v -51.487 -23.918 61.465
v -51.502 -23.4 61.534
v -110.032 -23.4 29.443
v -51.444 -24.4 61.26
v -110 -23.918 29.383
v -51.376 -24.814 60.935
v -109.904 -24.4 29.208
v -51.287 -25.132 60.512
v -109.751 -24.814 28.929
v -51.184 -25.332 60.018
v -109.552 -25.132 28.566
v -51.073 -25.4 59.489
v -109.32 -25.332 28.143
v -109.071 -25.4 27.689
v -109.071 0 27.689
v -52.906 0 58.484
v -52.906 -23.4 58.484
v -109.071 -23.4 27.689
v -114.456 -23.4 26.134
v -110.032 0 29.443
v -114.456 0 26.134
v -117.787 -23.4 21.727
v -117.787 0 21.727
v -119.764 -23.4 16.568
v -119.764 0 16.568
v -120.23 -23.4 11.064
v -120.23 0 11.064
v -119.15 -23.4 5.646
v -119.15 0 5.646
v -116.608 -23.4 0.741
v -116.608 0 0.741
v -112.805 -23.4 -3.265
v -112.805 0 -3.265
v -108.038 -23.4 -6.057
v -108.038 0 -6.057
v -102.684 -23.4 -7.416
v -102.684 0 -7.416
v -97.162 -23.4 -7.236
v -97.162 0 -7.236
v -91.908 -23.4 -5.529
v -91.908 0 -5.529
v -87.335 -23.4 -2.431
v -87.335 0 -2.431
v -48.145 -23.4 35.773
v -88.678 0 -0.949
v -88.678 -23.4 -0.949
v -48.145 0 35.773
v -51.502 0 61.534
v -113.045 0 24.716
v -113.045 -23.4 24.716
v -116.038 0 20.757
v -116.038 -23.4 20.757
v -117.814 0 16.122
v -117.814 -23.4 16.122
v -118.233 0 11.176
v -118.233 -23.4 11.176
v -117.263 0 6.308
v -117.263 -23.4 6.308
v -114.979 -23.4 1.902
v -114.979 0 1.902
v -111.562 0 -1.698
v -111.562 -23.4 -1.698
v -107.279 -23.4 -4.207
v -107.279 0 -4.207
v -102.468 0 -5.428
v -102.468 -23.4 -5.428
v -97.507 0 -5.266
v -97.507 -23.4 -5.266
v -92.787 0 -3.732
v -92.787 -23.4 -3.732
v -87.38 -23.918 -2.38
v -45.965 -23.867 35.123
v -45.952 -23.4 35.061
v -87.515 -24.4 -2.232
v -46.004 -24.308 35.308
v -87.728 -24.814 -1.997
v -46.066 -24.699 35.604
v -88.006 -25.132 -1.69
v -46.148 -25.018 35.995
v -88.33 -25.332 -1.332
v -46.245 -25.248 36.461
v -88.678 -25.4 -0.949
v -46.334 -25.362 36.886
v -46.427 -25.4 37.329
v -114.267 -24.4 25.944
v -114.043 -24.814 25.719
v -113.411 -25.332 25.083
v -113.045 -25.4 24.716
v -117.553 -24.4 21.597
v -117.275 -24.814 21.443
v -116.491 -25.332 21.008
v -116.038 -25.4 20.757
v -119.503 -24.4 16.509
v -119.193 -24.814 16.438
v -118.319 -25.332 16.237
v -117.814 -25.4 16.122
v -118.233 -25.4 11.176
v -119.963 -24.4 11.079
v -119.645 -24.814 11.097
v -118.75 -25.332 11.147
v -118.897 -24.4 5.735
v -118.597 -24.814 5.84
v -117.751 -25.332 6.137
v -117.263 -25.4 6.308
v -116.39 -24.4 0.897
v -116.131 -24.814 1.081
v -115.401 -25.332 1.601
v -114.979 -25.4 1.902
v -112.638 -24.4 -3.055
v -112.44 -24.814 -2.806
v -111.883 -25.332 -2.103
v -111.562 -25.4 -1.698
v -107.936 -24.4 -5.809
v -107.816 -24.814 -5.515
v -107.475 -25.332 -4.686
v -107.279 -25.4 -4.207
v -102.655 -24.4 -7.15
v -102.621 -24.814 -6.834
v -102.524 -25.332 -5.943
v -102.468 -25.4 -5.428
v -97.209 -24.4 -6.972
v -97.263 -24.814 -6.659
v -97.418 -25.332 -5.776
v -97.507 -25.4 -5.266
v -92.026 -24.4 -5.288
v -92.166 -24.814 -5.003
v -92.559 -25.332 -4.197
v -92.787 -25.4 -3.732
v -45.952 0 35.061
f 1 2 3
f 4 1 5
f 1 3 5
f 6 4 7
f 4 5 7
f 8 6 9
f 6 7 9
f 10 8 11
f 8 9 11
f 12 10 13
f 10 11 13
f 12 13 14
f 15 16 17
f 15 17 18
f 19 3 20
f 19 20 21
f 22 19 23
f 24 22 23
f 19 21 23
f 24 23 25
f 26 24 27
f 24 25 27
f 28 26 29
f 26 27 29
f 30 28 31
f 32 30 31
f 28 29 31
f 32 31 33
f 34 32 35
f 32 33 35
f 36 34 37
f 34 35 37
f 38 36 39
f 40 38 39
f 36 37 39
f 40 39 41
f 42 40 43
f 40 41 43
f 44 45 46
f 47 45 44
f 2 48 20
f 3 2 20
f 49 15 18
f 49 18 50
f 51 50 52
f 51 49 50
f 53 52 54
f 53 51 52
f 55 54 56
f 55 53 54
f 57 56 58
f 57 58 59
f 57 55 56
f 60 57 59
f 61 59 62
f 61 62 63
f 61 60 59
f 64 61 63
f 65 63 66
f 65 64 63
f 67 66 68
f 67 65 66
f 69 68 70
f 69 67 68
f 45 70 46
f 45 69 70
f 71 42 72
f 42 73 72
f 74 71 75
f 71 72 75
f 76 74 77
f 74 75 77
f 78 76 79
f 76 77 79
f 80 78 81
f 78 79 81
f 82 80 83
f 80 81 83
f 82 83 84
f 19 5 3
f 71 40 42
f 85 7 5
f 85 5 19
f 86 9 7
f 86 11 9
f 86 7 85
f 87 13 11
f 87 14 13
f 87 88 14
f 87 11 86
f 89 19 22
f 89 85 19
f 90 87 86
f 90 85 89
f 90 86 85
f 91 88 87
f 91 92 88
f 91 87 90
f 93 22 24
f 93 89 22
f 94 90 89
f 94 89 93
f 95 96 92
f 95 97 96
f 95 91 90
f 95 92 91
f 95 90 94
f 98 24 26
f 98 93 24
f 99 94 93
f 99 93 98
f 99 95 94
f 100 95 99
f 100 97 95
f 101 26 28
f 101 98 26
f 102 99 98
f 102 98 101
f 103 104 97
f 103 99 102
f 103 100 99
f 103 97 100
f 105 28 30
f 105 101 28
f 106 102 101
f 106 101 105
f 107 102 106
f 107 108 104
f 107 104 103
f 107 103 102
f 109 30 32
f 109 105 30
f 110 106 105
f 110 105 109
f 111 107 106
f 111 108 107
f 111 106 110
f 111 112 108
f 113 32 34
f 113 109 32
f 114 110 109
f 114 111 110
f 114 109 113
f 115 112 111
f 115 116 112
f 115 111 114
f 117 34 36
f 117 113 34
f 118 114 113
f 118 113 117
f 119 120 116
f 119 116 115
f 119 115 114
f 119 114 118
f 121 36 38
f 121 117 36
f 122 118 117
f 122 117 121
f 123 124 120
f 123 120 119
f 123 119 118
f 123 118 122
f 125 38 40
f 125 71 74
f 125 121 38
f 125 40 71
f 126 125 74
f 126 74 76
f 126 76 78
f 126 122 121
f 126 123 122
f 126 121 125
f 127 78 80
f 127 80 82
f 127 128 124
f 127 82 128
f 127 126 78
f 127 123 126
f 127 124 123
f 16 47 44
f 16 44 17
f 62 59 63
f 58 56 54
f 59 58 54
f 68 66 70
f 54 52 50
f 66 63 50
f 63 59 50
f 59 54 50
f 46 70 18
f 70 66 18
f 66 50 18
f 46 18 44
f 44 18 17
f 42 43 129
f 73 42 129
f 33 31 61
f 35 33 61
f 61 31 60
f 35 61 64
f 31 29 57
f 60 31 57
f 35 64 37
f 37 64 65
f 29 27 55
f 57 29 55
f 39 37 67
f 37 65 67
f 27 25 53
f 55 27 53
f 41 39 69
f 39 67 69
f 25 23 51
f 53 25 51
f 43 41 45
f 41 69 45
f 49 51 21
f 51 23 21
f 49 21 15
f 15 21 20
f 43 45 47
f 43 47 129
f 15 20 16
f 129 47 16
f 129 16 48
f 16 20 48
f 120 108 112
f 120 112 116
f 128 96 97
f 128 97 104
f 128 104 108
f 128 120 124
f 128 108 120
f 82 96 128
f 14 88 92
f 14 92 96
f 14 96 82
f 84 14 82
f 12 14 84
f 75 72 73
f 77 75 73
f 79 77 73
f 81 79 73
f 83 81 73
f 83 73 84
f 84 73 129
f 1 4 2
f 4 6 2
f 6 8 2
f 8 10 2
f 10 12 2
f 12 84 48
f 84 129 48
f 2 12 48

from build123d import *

# Parameters (mm, degrees)
F1_DEPTH = 25.4
F2_R     = 2
F3_T     = 2


# Not quite as in the source:
# - a shell that OpenCascade refuses in one call is made with other operations: the cavity is built on its own and cut out


with BuildPart() as f1:
    # F0 (on Front) → F1 (new body)
    with BuildSketch(Plane.XZ):
        with BuildLine():
            Line((-51.5017161099, 61.5344954622), (-110.0323972047, 29.4426782099))
            ThreePointArc((-110.0323972047, 29.4426782099), (-116.6082312435, 0.741485542), (-87.3347394228, -2.4306951723))
            Line((-87.3347394228, -2.4306951723), (-45.9517985582, 35.0605621934))
            Line((-45.9517985582, 35.0605621934), (-51.5017161099, 61.5344954622))
        make_face()
    extrude(amount=F1_DEPTH)

    # F2
    f2_edges = [f1.edges().sort_by_distance(p)[0] for p in [
        (-80.767057, -25.4, 45.488587),
    ]]
    fillet(f2_edges, radius=F2_R)

    # F3: shell of thickness 2, made by hand


with BuildPart() as f3_core1:
    # F3_t2: copy of F1
    add(f1.part)

    # the walls: a layer under each face that stays
    f3_faces = [f3_core1.faces().sort_by_distance(p)[0] for p in [
        (-66.6432689905, -11.7, 16.3149335105),
        (-116.6082312435, -11.7, 0.741485542),
        (-48.7267573341, -12.7, 48.2975288278),
        (-80.7670566573, -11.7, 45.488586836),
        (-82.3442492315, -25.4, 26.9788079772),
    ]]
    thicken(f3_faces, amount=-F3_T, mode=Mode.SUBTRACT)


with BuildPart() as f1_1:
    add(f1.part)

    # what is left inside the walls is the cavity
    f3_cavity = [f3_core1.part.solids().sort_by_distance(p)[0] for p in [
        (-83.202908, -0.02, 15.807193),
    ]]
    add(f3_cavity, mode=Mode.SUBTRACT)


solid = f1_1.part
